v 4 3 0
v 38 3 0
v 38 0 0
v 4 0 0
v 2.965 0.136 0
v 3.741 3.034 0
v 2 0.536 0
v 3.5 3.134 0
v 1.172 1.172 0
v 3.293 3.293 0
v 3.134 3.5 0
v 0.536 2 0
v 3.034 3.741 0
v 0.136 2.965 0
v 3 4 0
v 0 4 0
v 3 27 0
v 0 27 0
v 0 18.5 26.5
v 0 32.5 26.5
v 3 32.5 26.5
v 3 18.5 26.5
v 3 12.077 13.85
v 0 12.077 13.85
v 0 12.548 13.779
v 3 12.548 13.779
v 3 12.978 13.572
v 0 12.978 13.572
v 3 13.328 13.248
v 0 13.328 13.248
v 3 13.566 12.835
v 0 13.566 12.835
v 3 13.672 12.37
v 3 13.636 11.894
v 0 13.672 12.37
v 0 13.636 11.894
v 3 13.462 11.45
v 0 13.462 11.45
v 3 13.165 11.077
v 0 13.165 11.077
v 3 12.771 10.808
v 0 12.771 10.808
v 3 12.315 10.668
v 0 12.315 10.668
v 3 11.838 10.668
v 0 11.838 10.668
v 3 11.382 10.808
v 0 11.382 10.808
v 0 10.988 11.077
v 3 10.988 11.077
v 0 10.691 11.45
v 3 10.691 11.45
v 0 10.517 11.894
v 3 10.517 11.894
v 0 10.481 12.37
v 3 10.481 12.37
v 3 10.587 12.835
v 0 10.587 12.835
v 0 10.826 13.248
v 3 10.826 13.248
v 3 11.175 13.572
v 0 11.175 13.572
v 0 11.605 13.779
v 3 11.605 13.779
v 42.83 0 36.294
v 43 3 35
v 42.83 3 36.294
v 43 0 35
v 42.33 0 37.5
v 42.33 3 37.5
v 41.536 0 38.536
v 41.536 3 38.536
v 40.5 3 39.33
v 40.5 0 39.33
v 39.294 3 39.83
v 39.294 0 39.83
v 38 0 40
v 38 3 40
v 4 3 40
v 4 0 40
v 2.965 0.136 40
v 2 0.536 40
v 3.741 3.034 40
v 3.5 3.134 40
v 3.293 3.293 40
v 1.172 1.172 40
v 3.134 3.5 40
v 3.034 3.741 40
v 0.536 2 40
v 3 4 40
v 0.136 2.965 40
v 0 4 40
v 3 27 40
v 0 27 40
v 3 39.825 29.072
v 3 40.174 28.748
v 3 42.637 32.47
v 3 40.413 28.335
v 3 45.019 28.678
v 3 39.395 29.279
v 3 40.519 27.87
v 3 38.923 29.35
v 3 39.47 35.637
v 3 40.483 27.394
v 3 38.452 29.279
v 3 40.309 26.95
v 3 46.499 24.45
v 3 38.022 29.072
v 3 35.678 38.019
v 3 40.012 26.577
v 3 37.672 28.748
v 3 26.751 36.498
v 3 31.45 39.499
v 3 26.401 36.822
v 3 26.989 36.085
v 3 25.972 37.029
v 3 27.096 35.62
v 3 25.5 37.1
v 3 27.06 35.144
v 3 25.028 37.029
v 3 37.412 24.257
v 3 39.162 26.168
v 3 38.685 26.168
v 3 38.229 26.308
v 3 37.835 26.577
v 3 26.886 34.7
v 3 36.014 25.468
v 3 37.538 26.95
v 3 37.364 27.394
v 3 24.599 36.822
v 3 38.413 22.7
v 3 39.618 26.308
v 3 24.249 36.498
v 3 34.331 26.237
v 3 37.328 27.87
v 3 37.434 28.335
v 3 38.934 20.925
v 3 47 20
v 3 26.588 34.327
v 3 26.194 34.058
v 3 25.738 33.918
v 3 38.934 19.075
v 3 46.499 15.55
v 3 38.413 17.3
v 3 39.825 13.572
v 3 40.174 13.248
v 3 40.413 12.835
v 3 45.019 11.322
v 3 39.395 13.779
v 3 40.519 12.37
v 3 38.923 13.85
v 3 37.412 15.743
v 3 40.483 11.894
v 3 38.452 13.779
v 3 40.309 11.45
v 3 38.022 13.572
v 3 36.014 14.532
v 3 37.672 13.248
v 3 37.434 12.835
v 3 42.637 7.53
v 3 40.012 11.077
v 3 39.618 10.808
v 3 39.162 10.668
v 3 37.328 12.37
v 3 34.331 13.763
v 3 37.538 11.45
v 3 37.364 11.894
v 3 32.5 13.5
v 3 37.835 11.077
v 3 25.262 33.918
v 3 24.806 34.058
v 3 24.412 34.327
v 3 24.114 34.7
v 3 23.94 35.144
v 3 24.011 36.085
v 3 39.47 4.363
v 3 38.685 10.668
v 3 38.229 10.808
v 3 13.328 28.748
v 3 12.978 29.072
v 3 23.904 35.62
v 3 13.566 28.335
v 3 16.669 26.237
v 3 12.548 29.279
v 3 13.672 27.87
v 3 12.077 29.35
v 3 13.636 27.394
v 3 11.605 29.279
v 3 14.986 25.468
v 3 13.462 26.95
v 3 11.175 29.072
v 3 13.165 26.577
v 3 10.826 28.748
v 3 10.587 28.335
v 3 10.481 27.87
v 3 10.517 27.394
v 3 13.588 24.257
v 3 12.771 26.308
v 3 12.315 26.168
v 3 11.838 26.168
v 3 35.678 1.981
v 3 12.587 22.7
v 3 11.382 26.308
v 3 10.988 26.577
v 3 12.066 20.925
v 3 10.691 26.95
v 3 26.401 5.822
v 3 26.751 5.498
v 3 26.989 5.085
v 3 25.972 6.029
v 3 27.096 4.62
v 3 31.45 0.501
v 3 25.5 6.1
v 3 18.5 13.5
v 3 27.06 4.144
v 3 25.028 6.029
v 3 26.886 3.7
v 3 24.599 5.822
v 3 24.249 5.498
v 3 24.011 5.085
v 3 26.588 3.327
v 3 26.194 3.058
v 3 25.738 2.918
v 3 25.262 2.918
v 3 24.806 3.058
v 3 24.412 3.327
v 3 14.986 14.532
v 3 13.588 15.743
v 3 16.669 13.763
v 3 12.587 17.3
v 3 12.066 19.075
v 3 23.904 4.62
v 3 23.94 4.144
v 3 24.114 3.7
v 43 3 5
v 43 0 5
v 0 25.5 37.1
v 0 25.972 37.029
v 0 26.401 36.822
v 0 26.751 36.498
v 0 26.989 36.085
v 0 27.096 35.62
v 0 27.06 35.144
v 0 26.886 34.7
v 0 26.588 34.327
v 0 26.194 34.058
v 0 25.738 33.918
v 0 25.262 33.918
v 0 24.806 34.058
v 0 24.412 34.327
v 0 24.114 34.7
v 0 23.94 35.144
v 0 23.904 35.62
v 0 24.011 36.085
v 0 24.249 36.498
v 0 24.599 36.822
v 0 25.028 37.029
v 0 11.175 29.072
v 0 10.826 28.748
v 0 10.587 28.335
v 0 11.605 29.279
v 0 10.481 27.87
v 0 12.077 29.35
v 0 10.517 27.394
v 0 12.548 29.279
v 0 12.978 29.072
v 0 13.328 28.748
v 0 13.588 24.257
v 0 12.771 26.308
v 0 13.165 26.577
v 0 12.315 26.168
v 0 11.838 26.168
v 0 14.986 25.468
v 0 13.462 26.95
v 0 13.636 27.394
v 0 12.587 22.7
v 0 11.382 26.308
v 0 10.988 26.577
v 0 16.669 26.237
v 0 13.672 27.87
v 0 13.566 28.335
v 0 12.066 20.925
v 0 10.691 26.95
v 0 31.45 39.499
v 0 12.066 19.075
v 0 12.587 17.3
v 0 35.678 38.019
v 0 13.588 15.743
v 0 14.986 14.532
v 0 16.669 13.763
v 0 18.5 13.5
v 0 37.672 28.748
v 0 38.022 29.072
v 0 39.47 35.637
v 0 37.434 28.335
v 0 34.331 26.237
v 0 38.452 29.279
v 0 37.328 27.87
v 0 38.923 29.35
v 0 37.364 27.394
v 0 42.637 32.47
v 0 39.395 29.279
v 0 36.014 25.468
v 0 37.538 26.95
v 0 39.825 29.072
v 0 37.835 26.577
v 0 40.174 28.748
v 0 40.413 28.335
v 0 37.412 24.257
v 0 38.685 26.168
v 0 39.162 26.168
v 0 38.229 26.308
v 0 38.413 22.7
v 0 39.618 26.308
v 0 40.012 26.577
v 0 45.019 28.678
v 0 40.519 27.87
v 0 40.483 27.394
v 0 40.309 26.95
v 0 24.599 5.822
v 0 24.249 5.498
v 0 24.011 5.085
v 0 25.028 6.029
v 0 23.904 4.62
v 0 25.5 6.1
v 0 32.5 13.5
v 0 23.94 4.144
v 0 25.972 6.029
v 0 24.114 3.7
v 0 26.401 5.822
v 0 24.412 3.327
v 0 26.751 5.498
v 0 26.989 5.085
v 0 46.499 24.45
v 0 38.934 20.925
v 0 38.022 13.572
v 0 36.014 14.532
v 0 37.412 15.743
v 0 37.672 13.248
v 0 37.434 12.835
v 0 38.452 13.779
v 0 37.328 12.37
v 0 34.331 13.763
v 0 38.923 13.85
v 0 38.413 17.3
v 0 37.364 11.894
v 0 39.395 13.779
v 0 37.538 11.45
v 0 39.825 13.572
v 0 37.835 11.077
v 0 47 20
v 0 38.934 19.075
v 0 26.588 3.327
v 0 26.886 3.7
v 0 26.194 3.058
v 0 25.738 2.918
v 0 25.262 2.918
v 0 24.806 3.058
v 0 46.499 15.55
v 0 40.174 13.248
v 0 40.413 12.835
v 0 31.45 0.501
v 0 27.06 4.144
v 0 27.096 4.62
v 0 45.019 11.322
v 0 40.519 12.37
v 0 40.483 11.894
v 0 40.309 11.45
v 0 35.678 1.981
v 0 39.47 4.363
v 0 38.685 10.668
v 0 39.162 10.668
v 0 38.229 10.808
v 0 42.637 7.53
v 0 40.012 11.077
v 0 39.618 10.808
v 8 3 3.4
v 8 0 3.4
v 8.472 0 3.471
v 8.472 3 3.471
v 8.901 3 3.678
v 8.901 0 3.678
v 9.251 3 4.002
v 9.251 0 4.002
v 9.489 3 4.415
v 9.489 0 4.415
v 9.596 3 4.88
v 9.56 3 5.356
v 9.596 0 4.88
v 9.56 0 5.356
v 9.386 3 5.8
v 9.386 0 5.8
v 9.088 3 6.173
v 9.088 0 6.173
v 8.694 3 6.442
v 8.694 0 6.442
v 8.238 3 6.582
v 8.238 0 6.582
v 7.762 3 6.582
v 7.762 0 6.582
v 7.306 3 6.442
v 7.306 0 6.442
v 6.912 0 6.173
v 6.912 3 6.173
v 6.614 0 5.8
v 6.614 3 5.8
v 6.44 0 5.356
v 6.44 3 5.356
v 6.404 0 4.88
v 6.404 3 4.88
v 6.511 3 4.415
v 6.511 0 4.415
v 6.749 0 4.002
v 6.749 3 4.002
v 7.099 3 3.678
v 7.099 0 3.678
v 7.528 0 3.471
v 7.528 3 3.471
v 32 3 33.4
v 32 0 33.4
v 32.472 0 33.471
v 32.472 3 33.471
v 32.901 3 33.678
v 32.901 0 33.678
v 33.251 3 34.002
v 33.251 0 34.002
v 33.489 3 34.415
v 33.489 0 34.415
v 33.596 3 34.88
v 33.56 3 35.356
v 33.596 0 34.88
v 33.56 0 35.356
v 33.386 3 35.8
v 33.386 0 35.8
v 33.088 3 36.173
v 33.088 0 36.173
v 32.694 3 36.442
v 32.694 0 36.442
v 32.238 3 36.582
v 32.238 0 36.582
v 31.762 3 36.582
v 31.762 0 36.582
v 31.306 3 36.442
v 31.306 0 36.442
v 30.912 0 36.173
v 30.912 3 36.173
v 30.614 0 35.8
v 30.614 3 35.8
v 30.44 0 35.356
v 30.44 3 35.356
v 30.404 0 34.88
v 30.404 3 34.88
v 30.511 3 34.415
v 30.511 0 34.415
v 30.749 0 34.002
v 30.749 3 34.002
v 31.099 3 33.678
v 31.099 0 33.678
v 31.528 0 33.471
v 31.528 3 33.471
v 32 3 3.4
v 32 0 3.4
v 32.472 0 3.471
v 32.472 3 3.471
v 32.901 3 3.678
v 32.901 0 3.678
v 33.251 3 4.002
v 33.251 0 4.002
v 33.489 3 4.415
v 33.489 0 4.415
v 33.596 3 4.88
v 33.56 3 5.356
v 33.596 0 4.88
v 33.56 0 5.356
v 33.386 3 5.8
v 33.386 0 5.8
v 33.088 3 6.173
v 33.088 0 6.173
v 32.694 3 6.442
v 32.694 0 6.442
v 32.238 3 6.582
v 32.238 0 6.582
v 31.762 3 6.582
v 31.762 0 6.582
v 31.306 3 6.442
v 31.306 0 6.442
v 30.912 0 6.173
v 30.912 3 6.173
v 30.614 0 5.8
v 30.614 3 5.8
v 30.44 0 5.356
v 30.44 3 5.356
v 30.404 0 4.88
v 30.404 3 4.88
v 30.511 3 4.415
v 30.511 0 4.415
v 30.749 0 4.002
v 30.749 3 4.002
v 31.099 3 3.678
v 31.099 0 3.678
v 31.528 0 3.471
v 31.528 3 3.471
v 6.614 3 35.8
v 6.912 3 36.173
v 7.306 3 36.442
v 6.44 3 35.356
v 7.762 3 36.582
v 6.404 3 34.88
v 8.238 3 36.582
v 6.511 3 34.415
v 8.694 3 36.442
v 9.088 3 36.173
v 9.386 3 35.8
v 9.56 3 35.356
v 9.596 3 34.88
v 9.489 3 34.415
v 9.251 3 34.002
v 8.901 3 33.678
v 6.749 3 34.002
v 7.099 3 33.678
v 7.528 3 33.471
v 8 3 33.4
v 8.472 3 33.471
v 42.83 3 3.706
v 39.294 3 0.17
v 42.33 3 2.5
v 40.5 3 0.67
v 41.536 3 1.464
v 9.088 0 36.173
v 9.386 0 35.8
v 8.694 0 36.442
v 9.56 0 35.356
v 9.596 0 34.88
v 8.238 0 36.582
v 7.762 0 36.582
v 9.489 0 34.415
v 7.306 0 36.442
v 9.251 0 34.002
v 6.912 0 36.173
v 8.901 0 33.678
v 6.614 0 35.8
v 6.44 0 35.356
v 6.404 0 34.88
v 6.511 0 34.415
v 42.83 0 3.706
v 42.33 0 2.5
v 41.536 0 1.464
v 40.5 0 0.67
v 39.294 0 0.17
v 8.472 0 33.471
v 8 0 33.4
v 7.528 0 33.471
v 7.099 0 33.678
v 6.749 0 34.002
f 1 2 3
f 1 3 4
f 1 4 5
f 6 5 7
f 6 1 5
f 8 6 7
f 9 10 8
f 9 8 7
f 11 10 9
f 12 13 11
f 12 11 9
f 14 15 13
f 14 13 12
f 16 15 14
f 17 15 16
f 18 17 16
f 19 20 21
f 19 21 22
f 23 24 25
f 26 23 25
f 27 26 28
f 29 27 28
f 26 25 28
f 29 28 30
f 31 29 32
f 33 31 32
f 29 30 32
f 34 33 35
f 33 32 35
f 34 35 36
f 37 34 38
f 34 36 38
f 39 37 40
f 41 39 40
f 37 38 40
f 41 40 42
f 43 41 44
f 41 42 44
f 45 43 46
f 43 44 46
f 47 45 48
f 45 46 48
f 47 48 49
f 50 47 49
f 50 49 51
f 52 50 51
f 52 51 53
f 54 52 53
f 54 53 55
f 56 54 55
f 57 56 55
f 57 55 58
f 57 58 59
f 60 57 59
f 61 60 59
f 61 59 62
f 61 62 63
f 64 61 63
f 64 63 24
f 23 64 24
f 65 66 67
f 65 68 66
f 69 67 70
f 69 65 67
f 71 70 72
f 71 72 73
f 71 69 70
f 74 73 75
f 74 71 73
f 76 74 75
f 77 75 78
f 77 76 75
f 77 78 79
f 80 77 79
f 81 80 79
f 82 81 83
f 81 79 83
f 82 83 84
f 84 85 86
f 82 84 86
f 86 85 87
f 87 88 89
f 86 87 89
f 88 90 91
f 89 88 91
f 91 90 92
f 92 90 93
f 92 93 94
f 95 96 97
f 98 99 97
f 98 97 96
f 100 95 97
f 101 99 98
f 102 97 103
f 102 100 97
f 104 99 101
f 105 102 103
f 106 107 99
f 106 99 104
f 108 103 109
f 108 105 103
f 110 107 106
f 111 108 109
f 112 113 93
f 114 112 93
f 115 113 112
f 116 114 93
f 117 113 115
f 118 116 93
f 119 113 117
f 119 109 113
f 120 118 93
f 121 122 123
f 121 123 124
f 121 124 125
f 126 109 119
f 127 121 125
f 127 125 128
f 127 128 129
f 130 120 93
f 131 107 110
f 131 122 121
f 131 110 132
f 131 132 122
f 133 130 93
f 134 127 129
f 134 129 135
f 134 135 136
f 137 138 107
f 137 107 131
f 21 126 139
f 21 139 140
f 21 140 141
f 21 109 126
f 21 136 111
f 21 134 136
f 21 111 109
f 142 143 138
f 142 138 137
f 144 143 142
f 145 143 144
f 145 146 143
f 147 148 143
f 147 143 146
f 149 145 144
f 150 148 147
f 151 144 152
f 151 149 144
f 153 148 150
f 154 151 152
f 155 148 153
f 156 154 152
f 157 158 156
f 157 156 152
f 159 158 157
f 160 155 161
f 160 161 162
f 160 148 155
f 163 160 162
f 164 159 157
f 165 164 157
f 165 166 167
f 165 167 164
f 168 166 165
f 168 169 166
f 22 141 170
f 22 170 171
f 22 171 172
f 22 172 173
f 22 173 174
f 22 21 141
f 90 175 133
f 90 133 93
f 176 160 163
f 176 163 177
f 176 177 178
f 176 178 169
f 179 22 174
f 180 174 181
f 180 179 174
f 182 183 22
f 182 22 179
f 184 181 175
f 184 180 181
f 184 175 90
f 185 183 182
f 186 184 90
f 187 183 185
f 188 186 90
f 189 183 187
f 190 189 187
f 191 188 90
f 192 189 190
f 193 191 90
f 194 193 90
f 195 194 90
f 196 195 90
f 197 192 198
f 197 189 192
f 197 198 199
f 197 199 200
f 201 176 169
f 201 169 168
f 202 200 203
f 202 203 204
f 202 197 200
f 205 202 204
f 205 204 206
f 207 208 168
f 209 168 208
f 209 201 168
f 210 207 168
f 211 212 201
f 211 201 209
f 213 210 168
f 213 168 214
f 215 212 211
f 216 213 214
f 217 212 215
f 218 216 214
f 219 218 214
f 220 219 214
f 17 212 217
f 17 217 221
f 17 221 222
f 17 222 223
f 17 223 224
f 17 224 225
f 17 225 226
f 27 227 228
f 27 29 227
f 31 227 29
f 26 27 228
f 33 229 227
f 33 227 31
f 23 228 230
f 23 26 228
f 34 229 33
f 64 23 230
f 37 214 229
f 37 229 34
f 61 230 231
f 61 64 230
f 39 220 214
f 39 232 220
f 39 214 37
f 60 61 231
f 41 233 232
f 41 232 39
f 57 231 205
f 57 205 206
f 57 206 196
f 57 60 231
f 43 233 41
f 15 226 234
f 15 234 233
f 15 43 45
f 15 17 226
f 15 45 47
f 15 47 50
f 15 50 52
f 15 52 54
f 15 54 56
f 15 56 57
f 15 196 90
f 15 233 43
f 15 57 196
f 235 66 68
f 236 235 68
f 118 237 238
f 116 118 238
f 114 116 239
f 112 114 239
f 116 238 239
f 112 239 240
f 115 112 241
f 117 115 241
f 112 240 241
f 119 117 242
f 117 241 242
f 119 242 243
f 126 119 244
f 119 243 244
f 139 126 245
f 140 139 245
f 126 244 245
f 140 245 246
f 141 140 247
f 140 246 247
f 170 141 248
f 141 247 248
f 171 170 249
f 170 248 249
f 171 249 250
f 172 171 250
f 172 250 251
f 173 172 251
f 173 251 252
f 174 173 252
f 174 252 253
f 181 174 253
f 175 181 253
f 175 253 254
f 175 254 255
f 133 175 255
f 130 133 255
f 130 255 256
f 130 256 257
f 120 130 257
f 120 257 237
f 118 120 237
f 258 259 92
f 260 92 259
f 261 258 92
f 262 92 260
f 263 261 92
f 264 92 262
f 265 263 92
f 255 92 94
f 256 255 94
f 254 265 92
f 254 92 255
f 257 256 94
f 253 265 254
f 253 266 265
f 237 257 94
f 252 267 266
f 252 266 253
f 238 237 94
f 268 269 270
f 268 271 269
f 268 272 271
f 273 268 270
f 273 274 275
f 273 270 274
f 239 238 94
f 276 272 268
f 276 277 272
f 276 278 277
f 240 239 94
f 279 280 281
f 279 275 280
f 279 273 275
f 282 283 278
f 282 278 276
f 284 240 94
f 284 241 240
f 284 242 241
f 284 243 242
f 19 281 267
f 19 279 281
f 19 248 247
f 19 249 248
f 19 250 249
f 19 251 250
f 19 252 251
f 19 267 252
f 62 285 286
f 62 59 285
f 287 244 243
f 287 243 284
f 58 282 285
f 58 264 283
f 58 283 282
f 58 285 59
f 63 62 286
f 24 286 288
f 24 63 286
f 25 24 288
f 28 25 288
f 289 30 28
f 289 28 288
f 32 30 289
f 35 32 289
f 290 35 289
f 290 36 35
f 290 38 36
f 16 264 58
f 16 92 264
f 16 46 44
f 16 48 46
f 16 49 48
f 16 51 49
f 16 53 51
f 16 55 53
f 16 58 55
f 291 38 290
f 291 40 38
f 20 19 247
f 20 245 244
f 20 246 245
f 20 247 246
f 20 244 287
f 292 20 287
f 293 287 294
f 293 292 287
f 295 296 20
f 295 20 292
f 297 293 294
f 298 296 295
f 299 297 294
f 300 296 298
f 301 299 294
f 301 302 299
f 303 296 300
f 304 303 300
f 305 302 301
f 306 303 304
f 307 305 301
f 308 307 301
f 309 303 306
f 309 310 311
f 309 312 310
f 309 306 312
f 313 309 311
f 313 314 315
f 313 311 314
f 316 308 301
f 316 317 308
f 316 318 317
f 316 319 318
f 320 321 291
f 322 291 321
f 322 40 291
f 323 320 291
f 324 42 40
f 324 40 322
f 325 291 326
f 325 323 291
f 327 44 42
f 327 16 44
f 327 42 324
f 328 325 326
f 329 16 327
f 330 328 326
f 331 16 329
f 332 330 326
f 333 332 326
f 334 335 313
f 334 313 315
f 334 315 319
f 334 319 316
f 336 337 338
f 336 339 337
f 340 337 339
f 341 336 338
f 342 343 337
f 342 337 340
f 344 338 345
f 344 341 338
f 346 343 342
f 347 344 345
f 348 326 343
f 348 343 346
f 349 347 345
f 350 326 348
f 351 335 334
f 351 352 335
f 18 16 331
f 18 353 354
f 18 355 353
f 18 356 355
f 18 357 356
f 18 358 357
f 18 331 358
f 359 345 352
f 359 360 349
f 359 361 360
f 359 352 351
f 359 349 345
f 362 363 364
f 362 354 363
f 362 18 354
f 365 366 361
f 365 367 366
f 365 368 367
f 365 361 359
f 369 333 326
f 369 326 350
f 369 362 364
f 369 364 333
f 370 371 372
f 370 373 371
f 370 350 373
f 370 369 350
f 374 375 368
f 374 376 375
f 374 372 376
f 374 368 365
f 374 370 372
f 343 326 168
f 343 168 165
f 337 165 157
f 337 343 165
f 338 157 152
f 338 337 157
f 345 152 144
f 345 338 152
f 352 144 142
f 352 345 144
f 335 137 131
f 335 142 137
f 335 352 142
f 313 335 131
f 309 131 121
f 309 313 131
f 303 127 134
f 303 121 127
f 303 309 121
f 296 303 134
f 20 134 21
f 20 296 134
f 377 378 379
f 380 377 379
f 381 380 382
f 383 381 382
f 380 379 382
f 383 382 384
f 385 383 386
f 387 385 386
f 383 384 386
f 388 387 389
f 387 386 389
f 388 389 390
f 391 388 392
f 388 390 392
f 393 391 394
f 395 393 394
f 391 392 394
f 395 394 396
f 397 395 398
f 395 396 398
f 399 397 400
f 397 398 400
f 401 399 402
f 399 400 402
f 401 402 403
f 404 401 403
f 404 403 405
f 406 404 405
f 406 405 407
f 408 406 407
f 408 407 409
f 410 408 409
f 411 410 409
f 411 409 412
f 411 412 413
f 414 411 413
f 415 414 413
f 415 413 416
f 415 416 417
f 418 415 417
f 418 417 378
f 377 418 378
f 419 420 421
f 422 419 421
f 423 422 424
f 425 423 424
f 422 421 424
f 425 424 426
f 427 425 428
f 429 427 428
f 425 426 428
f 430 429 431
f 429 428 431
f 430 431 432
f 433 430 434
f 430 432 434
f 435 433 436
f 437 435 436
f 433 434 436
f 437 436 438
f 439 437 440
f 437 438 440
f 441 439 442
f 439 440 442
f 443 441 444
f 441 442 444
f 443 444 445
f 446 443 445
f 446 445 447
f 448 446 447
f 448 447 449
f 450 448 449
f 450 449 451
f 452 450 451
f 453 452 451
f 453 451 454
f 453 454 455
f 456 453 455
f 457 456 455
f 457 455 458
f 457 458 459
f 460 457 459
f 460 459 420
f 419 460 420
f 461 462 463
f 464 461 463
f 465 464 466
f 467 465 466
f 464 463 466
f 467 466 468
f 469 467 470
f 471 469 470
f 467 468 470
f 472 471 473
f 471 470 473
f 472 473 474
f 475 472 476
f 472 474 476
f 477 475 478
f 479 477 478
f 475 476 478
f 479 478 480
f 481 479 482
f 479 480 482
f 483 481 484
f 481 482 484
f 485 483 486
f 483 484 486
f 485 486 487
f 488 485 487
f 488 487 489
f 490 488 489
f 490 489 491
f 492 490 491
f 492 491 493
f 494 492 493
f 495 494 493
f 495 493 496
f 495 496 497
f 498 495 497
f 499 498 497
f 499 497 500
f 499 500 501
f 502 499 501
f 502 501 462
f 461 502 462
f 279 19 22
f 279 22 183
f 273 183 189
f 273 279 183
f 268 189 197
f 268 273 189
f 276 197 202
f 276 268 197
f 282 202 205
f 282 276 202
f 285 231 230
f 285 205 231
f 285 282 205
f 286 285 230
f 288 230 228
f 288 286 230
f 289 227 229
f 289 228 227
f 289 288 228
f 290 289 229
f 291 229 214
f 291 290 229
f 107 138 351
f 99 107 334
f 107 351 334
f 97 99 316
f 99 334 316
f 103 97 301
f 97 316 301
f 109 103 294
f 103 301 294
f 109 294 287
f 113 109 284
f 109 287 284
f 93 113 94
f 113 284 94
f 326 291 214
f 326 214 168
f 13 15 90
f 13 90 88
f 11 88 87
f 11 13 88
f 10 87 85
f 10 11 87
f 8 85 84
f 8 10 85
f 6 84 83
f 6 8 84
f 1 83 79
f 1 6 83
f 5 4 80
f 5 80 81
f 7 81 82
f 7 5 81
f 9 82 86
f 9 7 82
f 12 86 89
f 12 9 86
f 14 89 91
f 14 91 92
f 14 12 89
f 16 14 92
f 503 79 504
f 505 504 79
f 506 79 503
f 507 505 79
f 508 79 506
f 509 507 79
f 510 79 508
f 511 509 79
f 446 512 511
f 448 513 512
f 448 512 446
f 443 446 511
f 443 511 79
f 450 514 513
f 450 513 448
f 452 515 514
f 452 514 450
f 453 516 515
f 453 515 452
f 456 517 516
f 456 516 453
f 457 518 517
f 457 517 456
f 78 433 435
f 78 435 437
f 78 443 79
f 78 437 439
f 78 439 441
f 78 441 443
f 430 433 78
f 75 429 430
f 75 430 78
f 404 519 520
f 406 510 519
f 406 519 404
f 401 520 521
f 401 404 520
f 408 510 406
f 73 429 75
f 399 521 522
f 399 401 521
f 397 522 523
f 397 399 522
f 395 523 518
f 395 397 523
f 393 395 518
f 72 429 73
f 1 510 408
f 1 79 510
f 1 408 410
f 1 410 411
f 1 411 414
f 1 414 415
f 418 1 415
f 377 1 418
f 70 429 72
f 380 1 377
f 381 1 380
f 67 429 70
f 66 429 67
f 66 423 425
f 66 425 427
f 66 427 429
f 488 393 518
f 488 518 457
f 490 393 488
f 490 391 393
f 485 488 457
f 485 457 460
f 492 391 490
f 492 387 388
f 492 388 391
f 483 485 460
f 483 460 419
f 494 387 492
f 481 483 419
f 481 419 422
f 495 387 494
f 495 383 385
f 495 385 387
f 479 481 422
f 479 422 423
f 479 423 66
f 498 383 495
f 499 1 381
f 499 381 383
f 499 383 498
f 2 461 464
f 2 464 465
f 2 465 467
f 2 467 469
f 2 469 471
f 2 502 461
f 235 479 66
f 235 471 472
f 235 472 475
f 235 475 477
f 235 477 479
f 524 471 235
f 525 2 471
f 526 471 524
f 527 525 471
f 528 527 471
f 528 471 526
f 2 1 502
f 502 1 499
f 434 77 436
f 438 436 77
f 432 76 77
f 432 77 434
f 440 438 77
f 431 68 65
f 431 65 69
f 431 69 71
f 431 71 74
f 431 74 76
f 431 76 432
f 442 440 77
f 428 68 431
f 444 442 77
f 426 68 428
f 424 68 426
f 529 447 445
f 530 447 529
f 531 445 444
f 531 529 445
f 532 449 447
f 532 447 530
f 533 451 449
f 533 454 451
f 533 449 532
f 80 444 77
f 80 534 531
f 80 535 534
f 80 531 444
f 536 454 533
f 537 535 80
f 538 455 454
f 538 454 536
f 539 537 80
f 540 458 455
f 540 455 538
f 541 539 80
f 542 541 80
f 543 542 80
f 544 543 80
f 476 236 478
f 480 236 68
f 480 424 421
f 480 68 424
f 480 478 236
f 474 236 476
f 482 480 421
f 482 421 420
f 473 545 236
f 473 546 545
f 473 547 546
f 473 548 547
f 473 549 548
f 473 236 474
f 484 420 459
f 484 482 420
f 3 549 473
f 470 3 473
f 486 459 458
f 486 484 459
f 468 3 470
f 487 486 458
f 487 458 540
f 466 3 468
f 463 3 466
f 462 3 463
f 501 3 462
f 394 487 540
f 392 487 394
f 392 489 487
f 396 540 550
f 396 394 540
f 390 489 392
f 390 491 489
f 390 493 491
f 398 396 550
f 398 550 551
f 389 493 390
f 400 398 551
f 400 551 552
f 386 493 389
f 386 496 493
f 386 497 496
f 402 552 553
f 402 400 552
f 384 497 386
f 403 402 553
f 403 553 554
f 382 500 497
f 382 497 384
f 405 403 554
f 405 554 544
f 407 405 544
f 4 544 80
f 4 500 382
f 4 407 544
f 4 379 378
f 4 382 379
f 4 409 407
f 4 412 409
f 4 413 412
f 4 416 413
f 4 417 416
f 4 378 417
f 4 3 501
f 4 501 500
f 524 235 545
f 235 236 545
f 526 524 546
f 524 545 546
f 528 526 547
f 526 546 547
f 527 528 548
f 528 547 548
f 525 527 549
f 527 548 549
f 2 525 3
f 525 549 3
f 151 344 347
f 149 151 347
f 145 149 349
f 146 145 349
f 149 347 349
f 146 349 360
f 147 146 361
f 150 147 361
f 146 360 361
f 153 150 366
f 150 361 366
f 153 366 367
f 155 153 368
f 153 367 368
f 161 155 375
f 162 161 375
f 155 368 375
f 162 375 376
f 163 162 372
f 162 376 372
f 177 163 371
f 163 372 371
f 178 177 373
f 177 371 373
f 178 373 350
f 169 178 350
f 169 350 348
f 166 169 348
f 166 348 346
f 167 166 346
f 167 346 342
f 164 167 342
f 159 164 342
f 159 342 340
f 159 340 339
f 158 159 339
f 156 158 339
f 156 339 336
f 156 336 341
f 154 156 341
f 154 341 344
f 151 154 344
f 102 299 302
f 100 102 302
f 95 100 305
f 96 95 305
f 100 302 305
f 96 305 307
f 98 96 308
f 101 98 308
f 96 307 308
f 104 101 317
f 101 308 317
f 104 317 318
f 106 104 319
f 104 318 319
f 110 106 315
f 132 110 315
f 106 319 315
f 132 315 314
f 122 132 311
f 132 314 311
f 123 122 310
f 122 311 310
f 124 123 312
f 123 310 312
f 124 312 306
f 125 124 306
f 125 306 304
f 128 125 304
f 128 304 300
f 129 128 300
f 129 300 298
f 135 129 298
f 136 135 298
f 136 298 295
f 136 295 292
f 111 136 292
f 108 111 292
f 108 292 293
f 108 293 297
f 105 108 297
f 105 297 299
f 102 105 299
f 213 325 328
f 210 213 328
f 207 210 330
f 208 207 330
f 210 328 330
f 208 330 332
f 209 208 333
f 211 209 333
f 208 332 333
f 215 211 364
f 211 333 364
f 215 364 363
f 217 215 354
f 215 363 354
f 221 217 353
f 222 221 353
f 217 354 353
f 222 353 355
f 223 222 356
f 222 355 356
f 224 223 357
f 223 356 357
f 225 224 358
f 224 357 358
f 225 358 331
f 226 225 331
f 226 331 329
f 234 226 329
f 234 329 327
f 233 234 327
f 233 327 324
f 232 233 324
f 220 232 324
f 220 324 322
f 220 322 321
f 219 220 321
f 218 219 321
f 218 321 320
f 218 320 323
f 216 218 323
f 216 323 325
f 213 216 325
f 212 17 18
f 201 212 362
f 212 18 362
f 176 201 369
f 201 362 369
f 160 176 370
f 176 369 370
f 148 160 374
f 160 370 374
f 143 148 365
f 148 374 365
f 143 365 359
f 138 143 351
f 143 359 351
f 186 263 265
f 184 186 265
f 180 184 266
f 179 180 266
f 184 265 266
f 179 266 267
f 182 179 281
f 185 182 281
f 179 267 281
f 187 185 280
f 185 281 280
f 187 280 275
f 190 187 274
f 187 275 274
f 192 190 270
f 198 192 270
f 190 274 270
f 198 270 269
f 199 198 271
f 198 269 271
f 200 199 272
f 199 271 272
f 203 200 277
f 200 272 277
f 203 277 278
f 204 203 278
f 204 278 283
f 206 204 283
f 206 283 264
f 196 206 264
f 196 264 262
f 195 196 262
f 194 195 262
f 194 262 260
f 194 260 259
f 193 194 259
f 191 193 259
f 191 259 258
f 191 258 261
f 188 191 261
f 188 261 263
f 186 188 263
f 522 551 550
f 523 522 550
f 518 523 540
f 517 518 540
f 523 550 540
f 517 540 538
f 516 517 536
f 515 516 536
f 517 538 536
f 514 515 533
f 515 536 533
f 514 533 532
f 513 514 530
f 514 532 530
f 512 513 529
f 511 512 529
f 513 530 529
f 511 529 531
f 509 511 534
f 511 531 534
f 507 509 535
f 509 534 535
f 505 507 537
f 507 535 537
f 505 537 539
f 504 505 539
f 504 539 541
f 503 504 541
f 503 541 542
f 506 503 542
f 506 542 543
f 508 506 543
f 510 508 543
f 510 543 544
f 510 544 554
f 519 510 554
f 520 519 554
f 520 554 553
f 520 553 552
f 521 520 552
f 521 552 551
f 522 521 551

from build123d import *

# Parameters (mm, degrees)
SM_BASE_FLANGE_1_DEPTH      = 40
CUT_EXTRUDE_3_DEPTH         = 10
CUT_EXTRUDE_1_DEPTH         = 76.219678276
SKETCH_7_R                  = 1.6
CUT_EXTRUDE_2_DEPTH         = 76.219678276
SKETCH_9_R                  = 1.6
CUT_EXTRUDE_4_DEPTH         = 76.219678276
PATTERN_LINEAR_1_COUNT      = 2
PATTERN_LINEAR_1_PITCH      = 30
PATTERN_LINEAR_1_COUNT_DIR2 = 2
PATTERN_LINEAR_1_PITCH_DIR2 = 24
FILLET_1_R                  = 5


# Sheet-metal steps are written as plain solids
with BuildPart() as part:
    # Sketch 1 → 基材-凸緣1 (new body)
    with BuildSketch(Plane.XY):
        with BuildLine():
            Line((43, 0), (4, 0))
            ThreePointArc((4, 0), (1.171572875, 1.171572875), (0, 4))
            Line((0, 4), (0, 47))
            Line((0, 47), (3, 47))
            Line((3, 47), (3, 4))
            ThreePointArc((3, 4), (3.292893219, 3.292893219), (4, 3))
            Line((4, 3), (43, 3))
            Line((43, 3), (43, 0))
        make_face()
    extrude(amount=SM_BASE_FLANGE_1_DEPTH)

    # 草圖8 → 除料-伸長3 (cut)
    with BuildSketch(Plane.ZY):
        with BuildLine():
            Line((0, 47), (0, 27))
            ThreePointArc((0, 27), (5.857864376, 41.142135624), (20, 47))
            Line((20, 47), (0, 47))
        make_face()
        with BuildLine():
            ThreePointArc((20, 47), (34.142135624, 41.142135624), (40, 27))
            Line((40, 27), (40, 47))
            Line((40, 47), (20, 47))
        make_face()
    extrude(amount=-CUT_EXTRUDE_3_DEPTH, mode=Mode.SUBTRACT)

    # 草圖6 → 除料-伸長1 (cut, through all)
    with BuildSketch(Plane.ZY):
        with BuildLine():
            Line((26.5, 32.5), (26.5, 18.5))
            ThreePointArc((26.5, 18.5), (20, 12), (13.5, 18.5))
            Line((13.5, 18.5), (13.5, 32.5))
            ThreePointArc((13.5, 32.5), (20, 39), (26.5, 32.5))
        make_face()
    extrude(amount=-CUT_EXTRUDE_1_DEPTH, mode=Mode.SUBTRACT)

    # 草圖7 → 除料-伸長2 (cut, through all)
    with BuildSketch(Plane.ZY):
        with Locations((4.5, 25.5)):
            Circle(SKETCH_7_R)
        with Locations((12.25, 12.076606241)):
            Circle(SKETCH_7_R)
        with Locations((27.75, 12.076606241)):
            Circle(SKETCH_7_R)
        with Locations((35.5, 25.5)):
            Circle(SKETCH_7_R)
        with Locations((27.75, 38.923393759)):
            Circle(SKETCH_7_R)
        with Locations((12.25, 38.923393759)):
            Circle(SKETCH_7_R)
    extrude(amount=-CUT_EXTRUDE_2_DEPTH, mode=Mode.SUBTRACT)

    # 草圖9 → 除料-伸長4 (cut, through all)
    with BuildSketch(Plane.XZ):
        with Locations(Location((32, 35, 0), (0, 0, 270))):
            Circle(SKETCH_9_R)
    cut_extrude_4 = extrude(amount=-CUT_EXTRUDE_4_DEPTH, mode=Mode.SUBTRACT)

    # 直線複製排列1: Cut-Extrude 4 2 × 2
    with Locations(*[(-j * PATTERN_LINEAR_1_PITCH_DIR2, 0, -i * PATTERN_LINEAR_1_PITCH) for i in range(PATTERN_LINEAR_1_COUNT) for j in range(PATTERN_LINEAR_1_COUNT_DIR2) if (i, j) != (0, 0)]):
        add(cut_extrude_4, mode=Mode.SUBTRACT)

    # 圓角1
    fillet_1_edges = [part.edges().sort_by_distance(p)[0] for p in [
        (43, 1.5, 40),
        (43, 1.5, 0),
    ]]
    fillet(fillet_1_edges, radius=FILLET_1_R)


solid = part.part
